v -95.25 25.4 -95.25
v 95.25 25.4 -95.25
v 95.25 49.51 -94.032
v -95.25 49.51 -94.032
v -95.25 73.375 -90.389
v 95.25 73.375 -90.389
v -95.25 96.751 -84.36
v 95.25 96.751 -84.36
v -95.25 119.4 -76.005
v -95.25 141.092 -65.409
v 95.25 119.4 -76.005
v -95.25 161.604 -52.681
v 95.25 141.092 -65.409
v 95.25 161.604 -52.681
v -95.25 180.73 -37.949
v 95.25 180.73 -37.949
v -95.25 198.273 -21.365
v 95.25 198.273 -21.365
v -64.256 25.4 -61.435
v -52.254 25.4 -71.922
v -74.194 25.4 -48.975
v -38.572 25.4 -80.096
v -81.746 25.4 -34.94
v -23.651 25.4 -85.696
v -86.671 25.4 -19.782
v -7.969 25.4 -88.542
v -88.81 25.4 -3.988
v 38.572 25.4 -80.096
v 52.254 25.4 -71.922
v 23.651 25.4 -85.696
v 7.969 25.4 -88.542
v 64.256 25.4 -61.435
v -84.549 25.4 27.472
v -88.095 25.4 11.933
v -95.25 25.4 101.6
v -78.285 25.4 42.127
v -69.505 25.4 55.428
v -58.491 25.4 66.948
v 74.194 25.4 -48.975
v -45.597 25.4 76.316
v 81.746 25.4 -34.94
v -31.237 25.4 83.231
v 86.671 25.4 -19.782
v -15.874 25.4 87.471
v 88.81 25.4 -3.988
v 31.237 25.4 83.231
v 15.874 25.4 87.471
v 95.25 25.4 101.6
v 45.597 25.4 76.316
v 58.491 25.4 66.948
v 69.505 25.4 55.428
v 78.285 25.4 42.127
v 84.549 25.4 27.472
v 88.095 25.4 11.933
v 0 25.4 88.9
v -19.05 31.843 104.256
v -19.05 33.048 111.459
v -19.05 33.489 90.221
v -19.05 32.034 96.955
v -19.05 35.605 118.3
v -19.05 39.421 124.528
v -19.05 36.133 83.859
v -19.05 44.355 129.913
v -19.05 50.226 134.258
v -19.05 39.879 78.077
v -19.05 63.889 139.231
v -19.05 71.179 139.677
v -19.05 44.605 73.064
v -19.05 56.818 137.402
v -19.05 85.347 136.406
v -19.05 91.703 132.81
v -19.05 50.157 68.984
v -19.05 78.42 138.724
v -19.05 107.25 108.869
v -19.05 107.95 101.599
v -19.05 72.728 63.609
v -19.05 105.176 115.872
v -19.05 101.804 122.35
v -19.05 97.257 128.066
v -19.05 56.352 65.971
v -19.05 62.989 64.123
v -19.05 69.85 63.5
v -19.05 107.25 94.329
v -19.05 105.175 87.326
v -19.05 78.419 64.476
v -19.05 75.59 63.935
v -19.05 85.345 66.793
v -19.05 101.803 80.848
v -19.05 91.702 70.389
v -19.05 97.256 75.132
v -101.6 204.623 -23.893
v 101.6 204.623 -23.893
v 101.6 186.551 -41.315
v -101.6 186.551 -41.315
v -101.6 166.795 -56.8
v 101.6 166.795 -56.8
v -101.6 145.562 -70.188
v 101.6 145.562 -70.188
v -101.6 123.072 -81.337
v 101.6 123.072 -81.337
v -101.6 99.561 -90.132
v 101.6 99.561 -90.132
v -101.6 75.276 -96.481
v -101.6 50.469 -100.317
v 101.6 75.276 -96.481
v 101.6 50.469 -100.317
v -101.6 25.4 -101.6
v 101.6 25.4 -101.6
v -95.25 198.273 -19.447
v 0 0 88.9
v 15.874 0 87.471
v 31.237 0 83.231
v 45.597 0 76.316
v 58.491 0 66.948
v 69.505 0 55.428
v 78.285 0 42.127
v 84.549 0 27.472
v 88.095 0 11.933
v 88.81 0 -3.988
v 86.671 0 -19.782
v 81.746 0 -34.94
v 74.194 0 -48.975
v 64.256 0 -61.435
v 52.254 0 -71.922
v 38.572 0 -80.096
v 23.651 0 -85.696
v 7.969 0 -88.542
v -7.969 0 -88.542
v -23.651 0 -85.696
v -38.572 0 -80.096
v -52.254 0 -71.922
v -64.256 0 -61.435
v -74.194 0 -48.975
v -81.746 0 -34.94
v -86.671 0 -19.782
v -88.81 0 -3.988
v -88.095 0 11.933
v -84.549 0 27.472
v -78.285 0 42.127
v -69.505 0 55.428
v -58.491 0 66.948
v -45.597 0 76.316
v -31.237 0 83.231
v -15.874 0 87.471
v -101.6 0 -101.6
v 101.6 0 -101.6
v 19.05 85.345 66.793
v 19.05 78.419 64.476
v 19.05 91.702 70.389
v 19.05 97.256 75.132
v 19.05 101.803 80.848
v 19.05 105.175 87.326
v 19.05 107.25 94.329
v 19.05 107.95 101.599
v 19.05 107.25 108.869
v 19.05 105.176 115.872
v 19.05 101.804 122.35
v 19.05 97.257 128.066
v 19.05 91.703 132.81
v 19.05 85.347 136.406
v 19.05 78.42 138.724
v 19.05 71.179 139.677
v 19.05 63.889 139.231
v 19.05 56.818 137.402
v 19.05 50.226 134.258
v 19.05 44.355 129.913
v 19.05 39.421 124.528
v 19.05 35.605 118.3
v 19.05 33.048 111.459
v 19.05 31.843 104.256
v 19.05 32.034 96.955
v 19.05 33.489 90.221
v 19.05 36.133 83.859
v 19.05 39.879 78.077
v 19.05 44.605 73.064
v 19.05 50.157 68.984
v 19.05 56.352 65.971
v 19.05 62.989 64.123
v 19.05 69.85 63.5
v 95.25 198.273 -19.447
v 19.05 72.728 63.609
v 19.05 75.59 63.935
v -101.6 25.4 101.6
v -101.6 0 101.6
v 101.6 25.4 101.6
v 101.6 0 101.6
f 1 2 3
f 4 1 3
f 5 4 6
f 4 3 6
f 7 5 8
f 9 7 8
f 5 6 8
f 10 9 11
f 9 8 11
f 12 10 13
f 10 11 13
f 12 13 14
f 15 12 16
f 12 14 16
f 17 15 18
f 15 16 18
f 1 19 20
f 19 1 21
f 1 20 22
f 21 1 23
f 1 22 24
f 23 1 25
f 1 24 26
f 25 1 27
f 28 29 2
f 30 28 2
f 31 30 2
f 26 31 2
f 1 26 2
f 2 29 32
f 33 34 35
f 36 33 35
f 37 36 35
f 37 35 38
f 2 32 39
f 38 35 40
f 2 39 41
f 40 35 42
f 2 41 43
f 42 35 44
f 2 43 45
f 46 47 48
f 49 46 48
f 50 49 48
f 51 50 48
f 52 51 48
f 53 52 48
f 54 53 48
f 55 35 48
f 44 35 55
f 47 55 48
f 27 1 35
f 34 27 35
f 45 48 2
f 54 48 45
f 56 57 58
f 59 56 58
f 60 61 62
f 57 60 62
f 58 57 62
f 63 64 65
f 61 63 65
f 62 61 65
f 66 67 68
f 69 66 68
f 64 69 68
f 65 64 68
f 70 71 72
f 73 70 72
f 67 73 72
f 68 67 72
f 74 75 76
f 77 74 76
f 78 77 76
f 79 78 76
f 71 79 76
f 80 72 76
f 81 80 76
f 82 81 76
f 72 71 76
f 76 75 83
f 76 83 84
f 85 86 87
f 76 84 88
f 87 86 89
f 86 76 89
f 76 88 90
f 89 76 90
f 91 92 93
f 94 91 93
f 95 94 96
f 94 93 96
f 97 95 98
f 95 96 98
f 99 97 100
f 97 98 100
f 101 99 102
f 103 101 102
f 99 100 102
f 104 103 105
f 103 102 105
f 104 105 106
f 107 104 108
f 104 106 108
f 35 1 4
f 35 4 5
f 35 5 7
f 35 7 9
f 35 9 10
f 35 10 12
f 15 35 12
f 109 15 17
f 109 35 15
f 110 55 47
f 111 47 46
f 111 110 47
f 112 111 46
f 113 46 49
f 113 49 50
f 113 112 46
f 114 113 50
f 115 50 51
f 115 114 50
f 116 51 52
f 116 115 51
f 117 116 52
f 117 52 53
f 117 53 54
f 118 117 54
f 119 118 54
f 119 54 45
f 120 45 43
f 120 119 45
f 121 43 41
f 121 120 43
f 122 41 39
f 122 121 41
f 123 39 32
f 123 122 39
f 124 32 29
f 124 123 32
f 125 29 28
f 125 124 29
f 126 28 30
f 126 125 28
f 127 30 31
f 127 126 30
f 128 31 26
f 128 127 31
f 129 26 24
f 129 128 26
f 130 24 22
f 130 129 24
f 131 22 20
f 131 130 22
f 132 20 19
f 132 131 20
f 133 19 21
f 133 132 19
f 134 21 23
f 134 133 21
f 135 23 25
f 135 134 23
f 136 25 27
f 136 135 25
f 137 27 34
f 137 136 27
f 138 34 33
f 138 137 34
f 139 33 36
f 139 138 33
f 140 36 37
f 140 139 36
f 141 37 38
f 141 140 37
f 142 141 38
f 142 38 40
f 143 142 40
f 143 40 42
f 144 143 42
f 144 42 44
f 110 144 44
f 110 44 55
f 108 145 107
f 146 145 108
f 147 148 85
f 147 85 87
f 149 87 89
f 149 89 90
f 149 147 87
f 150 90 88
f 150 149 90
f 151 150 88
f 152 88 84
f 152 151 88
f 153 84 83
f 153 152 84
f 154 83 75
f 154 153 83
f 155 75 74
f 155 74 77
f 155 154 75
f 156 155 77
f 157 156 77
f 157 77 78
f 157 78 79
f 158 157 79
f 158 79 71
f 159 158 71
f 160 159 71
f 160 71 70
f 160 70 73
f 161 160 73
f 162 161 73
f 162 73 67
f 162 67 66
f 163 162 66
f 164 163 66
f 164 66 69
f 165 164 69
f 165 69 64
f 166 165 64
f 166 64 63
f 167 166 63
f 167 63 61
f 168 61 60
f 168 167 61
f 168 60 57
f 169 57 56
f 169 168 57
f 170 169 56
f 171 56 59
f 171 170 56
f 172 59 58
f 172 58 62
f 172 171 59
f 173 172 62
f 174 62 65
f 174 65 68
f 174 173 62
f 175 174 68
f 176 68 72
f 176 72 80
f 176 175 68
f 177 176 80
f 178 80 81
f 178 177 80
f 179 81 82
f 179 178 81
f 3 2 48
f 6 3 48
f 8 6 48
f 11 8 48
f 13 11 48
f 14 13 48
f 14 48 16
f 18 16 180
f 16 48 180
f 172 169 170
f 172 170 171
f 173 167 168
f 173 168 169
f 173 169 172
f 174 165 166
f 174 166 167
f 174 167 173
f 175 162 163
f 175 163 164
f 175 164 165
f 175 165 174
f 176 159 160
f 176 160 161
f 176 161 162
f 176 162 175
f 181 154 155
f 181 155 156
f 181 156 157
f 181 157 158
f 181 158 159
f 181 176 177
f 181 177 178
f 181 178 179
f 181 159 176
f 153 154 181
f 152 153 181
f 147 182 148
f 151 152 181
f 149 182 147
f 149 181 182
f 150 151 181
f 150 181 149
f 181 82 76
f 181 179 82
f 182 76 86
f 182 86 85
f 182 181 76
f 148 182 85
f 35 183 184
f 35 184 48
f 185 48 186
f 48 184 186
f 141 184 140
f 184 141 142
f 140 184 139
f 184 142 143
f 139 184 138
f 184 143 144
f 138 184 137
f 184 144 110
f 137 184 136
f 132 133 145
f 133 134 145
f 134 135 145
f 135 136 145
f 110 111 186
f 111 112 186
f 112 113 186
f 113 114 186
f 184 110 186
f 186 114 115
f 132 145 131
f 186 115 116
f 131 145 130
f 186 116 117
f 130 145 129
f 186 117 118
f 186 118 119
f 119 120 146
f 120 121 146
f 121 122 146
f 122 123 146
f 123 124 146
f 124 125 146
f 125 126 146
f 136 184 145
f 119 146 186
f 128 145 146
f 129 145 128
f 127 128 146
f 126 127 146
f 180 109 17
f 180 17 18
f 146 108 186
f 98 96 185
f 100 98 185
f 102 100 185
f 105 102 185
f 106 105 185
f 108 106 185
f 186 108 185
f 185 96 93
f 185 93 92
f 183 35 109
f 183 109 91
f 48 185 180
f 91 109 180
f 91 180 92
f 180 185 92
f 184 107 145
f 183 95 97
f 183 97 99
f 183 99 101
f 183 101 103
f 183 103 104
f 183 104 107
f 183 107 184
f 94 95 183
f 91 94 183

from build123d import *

# Parameters (mm, degrees)
SKETCH2_W               = 203.2
SKETCH2_H               = 203.2
SKETCH2_R               = 88.9
BOSS_EXTRUDE1_DEPTH     = 25.4
BOSS_EXTRUDE2_DEPTH     = 203.2
CUT_EXTRUDE3_REACH      = 307.75
CUT_EXTRUDE3_END_RADIUS = 239.183333333
SKETCH5_W               = 190.5
SKETCH5_H               = 172.872926977
BOSS_EXTRUDE3_DEPTH     = 19.05


with BuildPart() as part:
    # Sketch2 → Boss-Extrude1 (new body)
    with BuildSketch(Plane(origin=(0, 0, 0), x_dir=(1, 0, 0), z_dir=(0, 1, 0))):
        Rectangle(SKETCH2_W, SKETCH2_H)
        with Locations(Location((0, 0, 0), (0, 0, 270))):
            Circle(SKETCH2_R, mode=Mode.SUBTRACT)
    extrude(amount=BOSS_EXTRUDE1_DEPTH)

    # Sketch3 → Boss-Extrude2 (add)
    with BuildSketch(Plane(origin=(101.6, 0, 0), x_dir=(0, 0, -1), z_dir=(1, 0, 0))):
        with BuildLine():
            Line((-101.6, 25.4), (23.893244489, 204.622926977))
            ThreePointArc((23.893244489, 204.622926977), (81.337211626, 123.071896426), (101.6, 25.4))
            Line((101.6, 25.4), (-101.6, 25.4))
        make_face()
    extrude(amount=-BOSS_EXTRUDE2_DEPTH)

    # Cut-Extrude3: up to this cylinder (the profile starts inside it)
    cut_extrude3_end = Plane(origin=(0, 25.4, 143.933333333), z_dir=(1, 0, 0)) * Cylinder(CUT_EXTRUDE3_END_RADIUS, 1094.866666667, mode=Mode.PRIVATE)
    # Sketch5 → Cut-Extrude3 (cut, up to the surface)
    with BuildSketch(Plane.XY.offset(101.6), mode=Mode.PRIVATE) as cut_extrude3_sk1:
        with Locations((0, 111.836463489)):
            Rectangle(SKETCH5_W, SKETCH5_H)
    cut_extrude3_tool1 = extrude(cut_extrude3_sk1.sketch, amount=-CUT_EXTRUDE3_REACH, mode=Mode.PRIVATE) & cut_extrude3_end
    add(cut_extrude3_tool1.solids().sort_by_distance((0, 111.836463, 101.6))[0], mode=Mode.SUBTRACT)


with BuildPart() as body_2:
    # Sketch6 → Boss-Extrude3 (new, symmetric)
    with BuildSketch(Plane(origin=(0, 0, 0), x_dir=(0, 0, -1), z_dir=(1, 0, 0))):
        with BuildLine():
            ThreePointArc((-63.5, 69.85), (-63.744790714, 74.161975174), (-64.476017317, 78.41854187))
            Line((-64.476017317, 78.41854187), (-96.954645689, 32.0342535))
            ThreePointArc((-96.954645689, 32.0342535), (-73.06407528, 44.604980682), (-63.5, 69.85))
        make_face()
        with BuildLine():
            Line((-96.954645689, 32.0342535), (-64.476017317, 78.41854187))
            ThreePointArc((-64.476017317, 78.41854187), (-132.809692887, 91.703262225), (-96.954645689, 32.0342535))
        make_face()
    extrude(amount=BOSS_EXTRUDE3_DEPTH, both=True)


solid = Compound([part.part, body_2.part])
